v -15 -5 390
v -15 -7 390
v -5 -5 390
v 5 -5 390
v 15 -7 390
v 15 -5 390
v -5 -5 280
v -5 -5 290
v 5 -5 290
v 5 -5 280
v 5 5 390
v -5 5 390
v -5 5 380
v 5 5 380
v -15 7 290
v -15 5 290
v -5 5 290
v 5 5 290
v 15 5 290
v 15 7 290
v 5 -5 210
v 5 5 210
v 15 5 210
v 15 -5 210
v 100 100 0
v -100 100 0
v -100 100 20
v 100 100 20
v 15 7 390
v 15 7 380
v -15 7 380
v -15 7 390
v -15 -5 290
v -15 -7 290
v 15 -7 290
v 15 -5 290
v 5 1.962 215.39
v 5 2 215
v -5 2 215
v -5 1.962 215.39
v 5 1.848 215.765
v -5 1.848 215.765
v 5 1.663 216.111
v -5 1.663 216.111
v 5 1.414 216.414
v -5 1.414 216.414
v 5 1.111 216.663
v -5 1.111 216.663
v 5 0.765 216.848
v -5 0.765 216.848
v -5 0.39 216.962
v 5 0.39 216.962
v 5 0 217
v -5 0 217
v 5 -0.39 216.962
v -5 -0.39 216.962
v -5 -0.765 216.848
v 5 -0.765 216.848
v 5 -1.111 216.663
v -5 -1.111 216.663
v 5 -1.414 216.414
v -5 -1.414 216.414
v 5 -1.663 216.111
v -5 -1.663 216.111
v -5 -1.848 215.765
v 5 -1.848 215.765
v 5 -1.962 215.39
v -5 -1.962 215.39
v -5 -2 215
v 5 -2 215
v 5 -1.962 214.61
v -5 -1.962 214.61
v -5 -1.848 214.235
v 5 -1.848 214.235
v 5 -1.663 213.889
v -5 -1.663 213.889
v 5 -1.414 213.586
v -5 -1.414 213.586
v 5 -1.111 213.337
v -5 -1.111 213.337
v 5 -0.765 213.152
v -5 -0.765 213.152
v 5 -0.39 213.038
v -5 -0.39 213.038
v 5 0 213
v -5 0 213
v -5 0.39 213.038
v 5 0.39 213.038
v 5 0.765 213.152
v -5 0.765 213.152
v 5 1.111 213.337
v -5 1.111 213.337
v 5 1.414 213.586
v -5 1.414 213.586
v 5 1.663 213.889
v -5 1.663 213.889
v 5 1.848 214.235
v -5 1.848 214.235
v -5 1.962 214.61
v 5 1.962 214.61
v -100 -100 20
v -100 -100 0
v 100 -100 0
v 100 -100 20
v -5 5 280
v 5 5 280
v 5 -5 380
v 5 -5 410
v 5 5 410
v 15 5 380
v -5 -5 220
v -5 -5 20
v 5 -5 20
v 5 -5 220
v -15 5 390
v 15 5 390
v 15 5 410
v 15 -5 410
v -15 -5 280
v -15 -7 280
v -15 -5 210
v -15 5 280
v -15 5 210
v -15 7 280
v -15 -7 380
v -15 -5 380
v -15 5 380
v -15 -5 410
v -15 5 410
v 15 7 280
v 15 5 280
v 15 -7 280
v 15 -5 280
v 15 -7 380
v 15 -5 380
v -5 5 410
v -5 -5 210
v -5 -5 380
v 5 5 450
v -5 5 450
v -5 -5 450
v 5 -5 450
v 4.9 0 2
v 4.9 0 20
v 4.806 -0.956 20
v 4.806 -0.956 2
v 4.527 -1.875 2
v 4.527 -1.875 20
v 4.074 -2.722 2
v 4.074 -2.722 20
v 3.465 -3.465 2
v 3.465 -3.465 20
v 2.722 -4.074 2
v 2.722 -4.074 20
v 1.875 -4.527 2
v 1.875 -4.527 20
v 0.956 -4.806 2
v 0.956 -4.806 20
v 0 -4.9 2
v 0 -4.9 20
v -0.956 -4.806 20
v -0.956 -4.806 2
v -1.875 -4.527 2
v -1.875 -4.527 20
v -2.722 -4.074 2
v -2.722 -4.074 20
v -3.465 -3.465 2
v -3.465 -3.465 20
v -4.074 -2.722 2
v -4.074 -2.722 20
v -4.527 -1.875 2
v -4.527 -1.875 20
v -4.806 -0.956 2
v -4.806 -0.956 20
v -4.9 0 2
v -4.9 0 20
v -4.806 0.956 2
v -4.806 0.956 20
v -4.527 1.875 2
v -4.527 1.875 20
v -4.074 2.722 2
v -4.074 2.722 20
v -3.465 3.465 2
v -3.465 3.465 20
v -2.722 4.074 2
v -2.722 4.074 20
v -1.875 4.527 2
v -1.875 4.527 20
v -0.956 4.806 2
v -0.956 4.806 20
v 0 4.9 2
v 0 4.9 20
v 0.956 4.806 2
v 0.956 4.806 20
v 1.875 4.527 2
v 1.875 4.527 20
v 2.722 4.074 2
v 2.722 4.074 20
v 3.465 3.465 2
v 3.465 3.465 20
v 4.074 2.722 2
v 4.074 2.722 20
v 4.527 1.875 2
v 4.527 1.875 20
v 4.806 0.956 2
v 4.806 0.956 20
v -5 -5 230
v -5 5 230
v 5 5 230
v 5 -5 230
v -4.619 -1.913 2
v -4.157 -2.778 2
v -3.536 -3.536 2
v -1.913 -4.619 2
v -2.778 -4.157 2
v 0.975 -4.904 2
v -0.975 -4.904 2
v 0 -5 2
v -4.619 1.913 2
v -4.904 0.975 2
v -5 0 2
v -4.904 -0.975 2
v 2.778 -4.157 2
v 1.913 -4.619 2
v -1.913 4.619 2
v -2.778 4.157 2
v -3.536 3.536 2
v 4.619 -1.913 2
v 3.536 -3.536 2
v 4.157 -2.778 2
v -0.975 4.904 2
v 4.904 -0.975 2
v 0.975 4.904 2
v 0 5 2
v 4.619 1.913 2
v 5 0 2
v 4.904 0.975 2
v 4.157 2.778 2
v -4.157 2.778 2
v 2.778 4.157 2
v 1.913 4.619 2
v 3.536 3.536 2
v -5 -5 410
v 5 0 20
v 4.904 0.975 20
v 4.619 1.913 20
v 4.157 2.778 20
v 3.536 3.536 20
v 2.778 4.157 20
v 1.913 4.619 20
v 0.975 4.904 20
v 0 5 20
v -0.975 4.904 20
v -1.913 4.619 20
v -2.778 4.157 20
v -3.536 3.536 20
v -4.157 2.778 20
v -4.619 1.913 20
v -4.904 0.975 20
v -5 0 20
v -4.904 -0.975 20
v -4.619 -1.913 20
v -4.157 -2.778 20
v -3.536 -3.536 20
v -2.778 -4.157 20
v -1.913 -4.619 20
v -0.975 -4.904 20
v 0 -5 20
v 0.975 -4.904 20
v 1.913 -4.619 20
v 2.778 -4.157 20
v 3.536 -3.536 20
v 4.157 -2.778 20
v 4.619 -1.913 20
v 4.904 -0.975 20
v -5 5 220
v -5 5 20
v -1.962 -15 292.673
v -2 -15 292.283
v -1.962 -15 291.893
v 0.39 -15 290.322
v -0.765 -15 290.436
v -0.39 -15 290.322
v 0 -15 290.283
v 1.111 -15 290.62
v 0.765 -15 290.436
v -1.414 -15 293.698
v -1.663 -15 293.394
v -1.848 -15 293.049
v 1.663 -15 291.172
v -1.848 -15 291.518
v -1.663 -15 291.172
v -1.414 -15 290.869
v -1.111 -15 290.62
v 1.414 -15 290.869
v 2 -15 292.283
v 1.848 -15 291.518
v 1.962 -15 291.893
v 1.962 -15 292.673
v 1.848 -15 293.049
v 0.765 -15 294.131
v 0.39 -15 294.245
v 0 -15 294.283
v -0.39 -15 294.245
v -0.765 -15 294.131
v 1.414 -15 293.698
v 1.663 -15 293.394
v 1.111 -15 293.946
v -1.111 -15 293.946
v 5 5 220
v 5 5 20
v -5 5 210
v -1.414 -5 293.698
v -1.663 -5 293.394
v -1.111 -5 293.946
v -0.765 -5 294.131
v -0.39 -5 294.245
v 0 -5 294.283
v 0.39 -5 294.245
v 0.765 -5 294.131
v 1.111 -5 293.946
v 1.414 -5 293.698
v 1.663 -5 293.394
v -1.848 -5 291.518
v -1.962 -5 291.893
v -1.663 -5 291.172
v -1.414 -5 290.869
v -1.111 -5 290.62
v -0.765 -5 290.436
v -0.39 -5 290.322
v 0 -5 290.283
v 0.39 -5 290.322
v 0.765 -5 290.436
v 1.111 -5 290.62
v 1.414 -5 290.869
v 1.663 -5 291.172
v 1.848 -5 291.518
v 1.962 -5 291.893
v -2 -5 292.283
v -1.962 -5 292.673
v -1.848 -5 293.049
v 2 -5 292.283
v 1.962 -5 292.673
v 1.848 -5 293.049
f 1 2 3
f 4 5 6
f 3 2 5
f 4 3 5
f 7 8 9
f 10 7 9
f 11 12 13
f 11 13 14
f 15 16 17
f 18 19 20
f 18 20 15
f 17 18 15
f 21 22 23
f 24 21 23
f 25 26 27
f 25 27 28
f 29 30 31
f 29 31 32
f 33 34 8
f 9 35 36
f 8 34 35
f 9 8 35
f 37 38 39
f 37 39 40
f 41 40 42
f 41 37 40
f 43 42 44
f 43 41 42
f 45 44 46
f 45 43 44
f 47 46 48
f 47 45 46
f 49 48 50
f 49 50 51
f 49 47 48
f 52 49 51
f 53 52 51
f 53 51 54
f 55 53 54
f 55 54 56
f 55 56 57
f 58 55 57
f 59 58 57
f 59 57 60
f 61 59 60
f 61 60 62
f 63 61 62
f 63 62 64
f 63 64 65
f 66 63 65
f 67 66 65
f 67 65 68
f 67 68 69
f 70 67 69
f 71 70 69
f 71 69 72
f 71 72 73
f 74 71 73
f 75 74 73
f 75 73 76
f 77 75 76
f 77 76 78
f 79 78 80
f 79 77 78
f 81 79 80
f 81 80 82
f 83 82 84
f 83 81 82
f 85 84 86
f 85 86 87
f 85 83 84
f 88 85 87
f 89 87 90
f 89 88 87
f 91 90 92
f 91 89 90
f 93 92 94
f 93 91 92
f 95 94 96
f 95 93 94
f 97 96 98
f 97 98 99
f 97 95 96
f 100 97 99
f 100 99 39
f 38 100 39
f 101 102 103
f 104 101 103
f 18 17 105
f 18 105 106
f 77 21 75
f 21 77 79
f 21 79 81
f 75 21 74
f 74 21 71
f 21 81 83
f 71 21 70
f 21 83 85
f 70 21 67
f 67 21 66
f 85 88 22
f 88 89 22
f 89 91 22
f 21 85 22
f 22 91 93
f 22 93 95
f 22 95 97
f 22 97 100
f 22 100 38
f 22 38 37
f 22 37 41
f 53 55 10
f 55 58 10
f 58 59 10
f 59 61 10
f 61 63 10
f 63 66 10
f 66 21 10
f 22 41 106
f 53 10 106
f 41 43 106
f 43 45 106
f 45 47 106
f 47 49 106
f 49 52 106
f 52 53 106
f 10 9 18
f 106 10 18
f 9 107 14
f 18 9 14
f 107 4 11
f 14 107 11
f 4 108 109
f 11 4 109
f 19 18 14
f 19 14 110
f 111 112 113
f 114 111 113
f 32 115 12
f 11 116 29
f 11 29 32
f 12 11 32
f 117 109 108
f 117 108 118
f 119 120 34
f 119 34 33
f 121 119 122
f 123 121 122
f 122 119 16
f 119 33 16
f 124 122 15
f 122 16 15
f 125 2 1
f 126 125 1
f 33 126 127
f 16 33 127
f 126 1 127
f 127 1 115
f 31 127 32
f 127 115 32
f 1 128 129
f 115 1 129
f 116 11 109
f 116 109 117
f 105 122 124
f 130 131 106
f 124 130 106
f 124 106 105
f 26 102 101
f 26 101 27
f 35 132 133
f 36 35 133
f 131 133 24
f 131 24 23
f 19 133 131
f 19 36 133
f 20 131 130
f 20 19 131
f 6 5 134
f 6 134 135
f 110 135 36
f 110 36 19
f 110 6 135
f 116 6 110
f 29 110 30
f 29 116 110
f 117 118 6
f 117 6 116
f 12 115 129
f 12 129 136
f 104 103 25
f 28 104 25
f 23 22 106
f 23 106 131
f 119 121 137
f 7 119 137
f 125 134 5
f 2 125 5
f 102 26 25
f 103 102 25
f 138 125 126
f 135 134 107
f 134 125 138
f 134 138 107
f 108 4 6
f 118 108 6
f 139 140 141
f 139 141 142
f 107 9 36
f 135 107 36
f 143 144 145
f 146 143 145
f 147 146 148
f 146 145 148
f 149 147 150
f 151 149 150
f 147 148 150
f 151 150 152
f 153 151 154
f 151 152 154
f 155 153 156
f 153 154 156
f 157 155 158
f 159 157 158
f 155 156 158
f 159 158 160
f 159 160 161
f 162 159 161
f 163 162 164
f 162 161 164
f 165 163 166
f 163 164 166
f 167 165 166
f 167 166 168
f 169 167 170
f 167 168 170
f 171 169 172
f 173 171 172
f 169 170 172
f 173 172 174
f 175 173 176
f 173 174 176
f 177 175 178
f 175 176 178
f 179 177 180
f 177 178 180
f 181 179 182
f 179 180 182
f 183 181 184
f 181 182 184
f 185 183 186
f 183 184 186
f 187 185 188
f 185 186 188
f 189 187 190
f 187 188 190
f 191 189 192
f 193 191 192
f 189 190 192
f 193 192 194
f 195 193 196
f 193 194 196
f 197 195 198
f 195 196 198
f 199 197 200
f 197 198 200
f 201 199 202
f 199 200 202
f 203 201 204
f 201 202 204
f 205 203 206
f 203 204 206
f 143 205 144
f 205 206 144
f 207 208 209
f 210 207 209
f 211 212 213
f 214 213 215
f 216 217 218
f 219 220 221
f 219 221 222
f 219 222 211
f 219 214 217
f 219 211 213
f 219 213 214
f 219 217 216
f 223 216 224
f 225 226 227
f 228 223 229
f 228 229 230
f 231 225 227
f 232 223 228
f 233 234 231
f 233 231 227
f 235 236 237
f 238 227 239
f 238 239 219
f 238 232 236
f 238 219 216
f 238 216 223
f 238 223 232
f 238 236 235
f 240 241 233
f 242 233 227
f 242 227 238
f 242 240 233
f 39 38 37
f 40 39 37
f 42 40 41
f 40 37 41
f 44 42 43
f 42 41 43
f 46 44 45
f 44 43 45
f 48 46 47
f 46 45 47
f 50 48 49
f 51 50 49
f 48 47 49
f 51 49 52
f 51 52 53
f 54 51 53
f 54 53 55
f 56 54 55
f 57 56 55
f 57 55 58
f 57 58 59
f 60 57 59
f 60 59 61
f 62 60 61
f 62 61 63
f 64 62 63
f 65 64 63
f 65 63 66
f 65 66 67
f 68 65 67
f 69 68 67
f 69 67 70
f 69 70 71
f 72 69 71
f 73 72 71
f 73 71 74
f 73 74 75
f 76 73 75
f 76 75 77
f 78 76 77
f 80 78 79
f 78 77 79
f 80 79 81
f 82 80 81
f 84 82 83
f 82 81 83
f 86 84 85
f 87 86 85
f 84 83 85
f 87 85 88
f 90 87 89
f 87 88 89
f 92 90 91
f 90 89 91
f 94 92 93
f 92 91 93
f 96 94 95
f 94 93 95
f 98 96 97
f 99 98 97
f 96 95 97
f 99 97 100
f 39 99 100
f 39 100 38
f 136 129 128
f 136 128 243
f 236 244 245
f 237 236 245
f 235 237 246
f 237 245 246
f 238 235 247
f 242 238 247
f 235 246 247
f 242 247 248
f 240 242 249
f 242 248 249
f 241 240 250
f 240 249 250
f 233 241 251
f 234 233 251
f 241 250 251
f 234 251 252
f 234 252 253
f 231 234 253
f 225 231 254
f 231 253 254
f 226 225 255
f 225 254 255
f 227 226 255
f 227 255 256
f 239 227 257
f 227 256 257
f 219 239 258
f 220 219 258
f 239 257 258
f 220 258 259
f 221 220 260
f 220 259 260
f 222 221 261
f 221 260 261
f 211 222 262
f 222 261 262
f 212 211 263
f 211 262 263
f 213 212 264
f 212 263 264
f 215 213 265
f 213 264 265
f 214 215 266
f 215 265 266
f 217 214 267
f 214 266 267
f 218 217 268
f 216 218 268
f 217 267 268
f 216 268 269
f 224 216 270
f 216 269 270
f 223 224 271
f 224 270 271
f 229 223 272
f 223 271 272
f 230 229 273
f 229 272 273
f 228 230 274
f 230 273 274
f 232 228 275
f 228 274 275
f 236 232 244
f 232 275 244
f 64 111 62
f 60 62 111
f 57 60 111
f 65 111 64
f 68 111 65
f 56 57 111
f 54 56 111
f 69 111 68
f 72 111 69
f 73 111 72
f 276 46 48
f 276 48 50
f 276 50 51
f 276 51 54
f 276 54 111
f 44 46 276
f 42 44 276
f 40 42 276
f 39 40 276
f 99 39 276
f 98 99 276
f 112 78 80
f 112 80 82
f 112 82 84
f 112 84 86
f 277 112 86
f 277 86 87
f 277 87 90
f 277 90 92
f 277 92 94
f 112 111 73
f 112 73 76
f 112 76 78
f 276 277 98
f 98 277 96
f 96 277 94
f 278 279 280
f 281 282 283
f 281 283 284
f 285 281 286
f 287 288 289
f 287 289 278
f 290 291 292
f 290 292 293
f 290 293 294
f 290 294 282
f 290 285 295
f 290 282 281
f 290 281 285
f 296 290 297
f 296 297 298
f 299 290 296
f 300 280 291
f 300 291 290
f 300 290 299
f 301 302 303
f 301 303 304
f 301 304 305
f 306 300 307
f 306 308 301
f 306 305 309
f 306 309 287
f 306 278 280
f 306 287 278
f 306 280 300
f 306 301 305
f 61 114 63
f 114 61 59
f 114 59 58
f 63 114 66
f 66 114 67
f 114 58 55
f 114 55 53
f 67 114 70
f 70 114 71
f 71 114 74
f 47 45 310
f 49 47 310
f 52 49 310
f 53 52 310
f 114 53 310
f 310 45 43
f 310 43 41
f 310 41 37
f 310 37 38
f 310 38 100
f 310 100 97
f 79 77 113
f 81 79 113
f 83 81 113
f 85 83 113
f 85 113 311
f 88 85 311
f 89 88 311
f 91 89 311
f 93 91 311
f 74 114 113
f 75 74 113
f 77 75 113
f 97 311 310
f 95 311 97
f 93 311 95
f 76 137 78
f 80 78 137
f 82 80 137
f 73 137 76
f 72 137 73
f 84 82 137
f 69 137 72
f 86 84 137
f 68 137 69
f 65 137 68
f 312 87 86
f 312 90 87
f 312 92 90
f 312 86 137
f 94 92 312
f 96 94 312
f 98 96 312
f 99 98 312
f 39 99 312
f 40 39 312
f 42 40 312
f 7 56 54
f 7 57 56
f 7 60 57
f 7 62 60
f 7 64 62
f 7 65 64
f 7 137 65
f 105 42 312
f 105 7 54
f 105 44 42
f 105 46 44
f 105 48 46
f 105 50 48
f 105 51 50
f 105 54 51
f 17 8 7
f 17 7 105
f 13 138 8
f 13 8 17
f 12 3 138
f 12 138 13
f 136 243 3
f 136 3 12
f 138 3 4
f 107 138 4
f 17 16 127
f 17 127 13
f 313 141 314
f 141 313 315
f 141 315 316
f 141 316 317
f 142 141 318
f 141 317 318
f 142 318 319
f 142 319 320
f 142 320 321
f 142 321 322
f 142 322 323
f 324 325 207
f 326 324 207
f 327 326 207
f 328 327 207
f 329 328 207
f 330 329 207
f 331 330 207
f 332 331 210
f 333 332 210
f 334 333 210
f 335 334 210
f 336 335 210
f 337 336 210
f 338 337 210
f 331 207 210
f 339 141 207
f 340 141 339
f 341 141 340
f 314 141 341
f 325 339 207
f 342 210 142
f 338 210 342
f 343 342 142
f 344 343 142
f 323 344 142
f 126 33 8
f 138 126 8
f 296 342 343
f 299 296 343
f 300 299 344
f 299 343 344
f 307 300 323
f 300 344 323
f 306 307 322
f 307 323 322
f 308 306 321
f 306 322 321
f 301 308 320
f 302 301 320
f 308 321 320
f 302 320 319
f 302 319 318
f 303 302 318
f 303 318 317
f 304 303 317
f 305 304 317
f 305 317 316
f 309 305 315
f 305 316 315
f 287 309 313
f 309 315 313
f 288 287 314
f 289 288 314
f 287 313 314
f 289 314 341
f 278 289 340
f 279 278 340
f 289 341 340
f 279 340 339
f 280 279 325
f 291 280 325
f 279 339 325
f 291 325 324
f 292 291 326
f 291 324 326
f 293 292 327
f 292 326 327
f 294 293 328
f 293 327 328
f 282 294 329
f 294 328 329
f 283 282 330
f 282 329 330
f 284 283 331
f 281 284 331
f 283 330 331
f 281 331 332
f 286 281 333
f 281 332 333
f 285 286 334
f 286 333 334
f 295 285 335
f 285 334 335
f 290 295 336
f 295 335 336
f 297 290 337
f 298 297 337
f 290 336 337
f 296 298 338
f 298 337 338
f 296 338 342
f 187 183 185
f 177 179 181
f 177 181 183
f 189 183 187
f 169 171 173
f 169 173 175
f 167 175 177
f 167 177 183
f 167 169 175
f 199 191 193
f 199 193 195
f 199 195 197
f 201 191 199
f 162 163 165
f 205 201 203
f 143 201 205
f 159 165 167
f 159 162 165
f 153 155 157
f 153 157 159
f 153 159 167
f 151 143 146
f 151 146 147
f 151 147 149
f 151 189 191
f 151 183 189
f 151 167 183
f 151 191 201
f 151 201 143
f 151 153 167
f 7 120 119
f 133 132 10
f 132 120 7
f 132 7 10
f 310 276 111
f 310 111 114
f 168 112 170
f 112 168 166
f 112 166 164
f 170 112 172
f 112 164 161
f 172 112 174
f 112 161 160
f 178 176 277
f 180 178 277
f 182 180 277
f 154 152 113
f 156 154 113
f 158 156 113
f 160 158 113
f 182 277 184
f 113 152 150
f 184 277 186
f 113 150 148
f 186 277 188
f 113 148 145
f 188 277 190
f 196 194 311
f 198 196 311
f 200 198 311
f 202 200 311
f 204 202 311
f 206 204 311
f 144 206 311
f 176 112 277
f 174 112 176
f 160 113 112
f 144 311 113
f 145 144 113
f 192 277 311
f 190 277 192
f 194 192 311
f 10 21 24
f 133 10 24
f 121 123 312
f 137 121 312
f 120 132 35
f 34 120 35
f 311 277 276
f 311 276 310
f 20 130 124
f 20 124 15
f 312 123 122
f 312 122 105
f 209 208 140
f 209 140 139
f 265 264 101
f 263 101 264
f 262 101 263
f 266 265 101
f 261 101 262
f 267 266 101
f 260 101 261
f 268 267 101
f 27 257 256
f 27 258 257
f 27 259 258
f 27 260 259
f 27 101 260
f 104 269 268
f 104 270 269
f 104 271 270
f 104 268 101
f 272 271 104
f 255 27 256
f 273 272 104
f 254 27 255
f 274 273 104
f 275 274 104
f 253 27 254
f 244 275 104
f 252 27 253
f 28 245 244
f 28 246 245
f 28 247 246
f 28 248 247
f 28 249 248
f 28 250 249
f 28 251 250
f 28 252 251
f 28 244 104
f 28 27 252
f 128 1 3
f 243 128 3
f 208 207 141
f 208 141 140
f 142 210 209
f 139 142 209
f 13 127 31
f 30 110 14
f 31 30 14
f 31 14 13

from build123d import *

# Parameters (mm, degrees)
SKETCH_W        = 200
SKETCH_H        = 200
PAD_DEPTH       = 20
SKETCH002_R     = 5
POCKET_DEPTH    = 18
SKETCH003_W     = 10
SKETCH003_H     = 10
PAD001_DEPTH    = 200
SKETCH004_R     = 4.9
PAD002_DEPTH    = 18
SKETCH005_R     = 2
POCKET001_DEPTH = 10.001
SKETCH006_W     = 30
SKETCH006_H     = 10
PAD003_DEPTH    = 200
SKETCH007_W     = 14
SKETCH007_H     = 10
PAD004_DEPTH    = 30
SKETCH008_W     = 10
SKETCH008_H     = 10
POCKET002_DEPTH = 200.001
SKETCH009_R     = 2
PAD005_DEPTH    = 30
SKETCH010_W     = 10
SKETCH010_H     = 10
PAD006_DEPTH    = 220
SKETCH011_R     = 2
PAD007_DEPTH    = 10


with BuildPart() as link0:
    # Sketch → Pad (new body)
    with BuildSketch(Plane.XY):
        Rectangle(SKETCH_W, SKETCH_H)
    extrude(amount=PAD_DEPTH)

    # Sketch002 → Pocket (cut)
    with BuildSketch(Plane.XY.offset(20)):
        Circle(SKETCH002_R)
    extrude(amount=-POCKET_DEPTH, mode=Mode.SUBTRACT)


with BuildPart() as link1:
    # Sketch003 → Pad001 (new body)
    with BuildSketch(Plane.XY.offset(20)):
        Rectangle(SKETCH003_W, SKETCH003_H)
    extrude(amount=PAD001_DEPTH)

    # Sketch004 → Pad002 (new body)
    with BuildSketch(Plane(origin=(0, 0, 20), x_dir=(1, 0, 0), z_dir=(0, 0, -1))):
        Circle(SKETCH004_R)
    extrude(amount=PAD002_DEPTH)

    # Sketch005 → Pocket001 (cut, through all)
    with BuildSketch(Plane(origin=(5, 0, 20), x_dir=(0, 1, 0), z_dir=(1, 0, 0))):
        with Locations((0, 195)):
            Circle(SKETCH005_R)
    extrude(amount=-POCKET001_DEPTH, mode=Mode.SUBTRACT)


with BuildPart() as link2:
    # Sketch006 → Pad003 (new body)
    with BuildSketch(Plane.XY.offset(210)):
        Rectangle(SKETCH006_W, SKETCH006_H)
    extrude(amount=PAD003_DEPTH)

    # Sketch007 → Pad004 (new body)
    with BuildSketch(Plane(origin=(15, 0, 210), x_dir=(0, 1, 0), z_dir=(1, 0, 0))):
        with Locations((0, 75)):
            Rectangle(SKETCH007_W, SKETCH007_H)
        with Locations((0, 175)):
            Rectangle(SKETCH007_W, SKETCH007_H)
    extrude(amount=-PAD004_DEPTH)

    # Sketch008 → Pocket002 (cut, through all)
    with BuildSketch(Plane.XY.offset(410)):
        Rectangle(SKETCH008_W, SKETCH008_H)
    extrude(amount=-POCKET002_DEPTH, mode=Mode.SUBTRACT)

    # Sketch009 → Pad005 (new body)
    with BuildSketch(Plane(origin=(15, 0, 210), x_dir=(0, 1, 0), z_dir=(1, 0, 0))):
        with Locations((0, 5)):
            Circle(SKETCH009_R)
    extrude(amount=-PAD005_DEPTH)


with BuildPart() as link3:
    # Sketch010 → Pad006 (new body)
    with BuildSketch(Plane.XY.offset(230)):
        Rectangle(SKETCH010_W, SKETCH010_H)
    extrude(amount=PAD006_DEPTH)

    # Sketch011 → Pad007 (new body)
    with BuildSketch(Plane(origin=(0, -5, 230), x_dir=(1, 0, 0), z_dir=(0, -1, 0))):
        with Locations((0, 62.283295)):
            Circle(SKETCH011_R)
    extrude(amount=PAD007_DEPTH)


solid = Compound([link0.part, link1.part, link2.part, link3.part])
